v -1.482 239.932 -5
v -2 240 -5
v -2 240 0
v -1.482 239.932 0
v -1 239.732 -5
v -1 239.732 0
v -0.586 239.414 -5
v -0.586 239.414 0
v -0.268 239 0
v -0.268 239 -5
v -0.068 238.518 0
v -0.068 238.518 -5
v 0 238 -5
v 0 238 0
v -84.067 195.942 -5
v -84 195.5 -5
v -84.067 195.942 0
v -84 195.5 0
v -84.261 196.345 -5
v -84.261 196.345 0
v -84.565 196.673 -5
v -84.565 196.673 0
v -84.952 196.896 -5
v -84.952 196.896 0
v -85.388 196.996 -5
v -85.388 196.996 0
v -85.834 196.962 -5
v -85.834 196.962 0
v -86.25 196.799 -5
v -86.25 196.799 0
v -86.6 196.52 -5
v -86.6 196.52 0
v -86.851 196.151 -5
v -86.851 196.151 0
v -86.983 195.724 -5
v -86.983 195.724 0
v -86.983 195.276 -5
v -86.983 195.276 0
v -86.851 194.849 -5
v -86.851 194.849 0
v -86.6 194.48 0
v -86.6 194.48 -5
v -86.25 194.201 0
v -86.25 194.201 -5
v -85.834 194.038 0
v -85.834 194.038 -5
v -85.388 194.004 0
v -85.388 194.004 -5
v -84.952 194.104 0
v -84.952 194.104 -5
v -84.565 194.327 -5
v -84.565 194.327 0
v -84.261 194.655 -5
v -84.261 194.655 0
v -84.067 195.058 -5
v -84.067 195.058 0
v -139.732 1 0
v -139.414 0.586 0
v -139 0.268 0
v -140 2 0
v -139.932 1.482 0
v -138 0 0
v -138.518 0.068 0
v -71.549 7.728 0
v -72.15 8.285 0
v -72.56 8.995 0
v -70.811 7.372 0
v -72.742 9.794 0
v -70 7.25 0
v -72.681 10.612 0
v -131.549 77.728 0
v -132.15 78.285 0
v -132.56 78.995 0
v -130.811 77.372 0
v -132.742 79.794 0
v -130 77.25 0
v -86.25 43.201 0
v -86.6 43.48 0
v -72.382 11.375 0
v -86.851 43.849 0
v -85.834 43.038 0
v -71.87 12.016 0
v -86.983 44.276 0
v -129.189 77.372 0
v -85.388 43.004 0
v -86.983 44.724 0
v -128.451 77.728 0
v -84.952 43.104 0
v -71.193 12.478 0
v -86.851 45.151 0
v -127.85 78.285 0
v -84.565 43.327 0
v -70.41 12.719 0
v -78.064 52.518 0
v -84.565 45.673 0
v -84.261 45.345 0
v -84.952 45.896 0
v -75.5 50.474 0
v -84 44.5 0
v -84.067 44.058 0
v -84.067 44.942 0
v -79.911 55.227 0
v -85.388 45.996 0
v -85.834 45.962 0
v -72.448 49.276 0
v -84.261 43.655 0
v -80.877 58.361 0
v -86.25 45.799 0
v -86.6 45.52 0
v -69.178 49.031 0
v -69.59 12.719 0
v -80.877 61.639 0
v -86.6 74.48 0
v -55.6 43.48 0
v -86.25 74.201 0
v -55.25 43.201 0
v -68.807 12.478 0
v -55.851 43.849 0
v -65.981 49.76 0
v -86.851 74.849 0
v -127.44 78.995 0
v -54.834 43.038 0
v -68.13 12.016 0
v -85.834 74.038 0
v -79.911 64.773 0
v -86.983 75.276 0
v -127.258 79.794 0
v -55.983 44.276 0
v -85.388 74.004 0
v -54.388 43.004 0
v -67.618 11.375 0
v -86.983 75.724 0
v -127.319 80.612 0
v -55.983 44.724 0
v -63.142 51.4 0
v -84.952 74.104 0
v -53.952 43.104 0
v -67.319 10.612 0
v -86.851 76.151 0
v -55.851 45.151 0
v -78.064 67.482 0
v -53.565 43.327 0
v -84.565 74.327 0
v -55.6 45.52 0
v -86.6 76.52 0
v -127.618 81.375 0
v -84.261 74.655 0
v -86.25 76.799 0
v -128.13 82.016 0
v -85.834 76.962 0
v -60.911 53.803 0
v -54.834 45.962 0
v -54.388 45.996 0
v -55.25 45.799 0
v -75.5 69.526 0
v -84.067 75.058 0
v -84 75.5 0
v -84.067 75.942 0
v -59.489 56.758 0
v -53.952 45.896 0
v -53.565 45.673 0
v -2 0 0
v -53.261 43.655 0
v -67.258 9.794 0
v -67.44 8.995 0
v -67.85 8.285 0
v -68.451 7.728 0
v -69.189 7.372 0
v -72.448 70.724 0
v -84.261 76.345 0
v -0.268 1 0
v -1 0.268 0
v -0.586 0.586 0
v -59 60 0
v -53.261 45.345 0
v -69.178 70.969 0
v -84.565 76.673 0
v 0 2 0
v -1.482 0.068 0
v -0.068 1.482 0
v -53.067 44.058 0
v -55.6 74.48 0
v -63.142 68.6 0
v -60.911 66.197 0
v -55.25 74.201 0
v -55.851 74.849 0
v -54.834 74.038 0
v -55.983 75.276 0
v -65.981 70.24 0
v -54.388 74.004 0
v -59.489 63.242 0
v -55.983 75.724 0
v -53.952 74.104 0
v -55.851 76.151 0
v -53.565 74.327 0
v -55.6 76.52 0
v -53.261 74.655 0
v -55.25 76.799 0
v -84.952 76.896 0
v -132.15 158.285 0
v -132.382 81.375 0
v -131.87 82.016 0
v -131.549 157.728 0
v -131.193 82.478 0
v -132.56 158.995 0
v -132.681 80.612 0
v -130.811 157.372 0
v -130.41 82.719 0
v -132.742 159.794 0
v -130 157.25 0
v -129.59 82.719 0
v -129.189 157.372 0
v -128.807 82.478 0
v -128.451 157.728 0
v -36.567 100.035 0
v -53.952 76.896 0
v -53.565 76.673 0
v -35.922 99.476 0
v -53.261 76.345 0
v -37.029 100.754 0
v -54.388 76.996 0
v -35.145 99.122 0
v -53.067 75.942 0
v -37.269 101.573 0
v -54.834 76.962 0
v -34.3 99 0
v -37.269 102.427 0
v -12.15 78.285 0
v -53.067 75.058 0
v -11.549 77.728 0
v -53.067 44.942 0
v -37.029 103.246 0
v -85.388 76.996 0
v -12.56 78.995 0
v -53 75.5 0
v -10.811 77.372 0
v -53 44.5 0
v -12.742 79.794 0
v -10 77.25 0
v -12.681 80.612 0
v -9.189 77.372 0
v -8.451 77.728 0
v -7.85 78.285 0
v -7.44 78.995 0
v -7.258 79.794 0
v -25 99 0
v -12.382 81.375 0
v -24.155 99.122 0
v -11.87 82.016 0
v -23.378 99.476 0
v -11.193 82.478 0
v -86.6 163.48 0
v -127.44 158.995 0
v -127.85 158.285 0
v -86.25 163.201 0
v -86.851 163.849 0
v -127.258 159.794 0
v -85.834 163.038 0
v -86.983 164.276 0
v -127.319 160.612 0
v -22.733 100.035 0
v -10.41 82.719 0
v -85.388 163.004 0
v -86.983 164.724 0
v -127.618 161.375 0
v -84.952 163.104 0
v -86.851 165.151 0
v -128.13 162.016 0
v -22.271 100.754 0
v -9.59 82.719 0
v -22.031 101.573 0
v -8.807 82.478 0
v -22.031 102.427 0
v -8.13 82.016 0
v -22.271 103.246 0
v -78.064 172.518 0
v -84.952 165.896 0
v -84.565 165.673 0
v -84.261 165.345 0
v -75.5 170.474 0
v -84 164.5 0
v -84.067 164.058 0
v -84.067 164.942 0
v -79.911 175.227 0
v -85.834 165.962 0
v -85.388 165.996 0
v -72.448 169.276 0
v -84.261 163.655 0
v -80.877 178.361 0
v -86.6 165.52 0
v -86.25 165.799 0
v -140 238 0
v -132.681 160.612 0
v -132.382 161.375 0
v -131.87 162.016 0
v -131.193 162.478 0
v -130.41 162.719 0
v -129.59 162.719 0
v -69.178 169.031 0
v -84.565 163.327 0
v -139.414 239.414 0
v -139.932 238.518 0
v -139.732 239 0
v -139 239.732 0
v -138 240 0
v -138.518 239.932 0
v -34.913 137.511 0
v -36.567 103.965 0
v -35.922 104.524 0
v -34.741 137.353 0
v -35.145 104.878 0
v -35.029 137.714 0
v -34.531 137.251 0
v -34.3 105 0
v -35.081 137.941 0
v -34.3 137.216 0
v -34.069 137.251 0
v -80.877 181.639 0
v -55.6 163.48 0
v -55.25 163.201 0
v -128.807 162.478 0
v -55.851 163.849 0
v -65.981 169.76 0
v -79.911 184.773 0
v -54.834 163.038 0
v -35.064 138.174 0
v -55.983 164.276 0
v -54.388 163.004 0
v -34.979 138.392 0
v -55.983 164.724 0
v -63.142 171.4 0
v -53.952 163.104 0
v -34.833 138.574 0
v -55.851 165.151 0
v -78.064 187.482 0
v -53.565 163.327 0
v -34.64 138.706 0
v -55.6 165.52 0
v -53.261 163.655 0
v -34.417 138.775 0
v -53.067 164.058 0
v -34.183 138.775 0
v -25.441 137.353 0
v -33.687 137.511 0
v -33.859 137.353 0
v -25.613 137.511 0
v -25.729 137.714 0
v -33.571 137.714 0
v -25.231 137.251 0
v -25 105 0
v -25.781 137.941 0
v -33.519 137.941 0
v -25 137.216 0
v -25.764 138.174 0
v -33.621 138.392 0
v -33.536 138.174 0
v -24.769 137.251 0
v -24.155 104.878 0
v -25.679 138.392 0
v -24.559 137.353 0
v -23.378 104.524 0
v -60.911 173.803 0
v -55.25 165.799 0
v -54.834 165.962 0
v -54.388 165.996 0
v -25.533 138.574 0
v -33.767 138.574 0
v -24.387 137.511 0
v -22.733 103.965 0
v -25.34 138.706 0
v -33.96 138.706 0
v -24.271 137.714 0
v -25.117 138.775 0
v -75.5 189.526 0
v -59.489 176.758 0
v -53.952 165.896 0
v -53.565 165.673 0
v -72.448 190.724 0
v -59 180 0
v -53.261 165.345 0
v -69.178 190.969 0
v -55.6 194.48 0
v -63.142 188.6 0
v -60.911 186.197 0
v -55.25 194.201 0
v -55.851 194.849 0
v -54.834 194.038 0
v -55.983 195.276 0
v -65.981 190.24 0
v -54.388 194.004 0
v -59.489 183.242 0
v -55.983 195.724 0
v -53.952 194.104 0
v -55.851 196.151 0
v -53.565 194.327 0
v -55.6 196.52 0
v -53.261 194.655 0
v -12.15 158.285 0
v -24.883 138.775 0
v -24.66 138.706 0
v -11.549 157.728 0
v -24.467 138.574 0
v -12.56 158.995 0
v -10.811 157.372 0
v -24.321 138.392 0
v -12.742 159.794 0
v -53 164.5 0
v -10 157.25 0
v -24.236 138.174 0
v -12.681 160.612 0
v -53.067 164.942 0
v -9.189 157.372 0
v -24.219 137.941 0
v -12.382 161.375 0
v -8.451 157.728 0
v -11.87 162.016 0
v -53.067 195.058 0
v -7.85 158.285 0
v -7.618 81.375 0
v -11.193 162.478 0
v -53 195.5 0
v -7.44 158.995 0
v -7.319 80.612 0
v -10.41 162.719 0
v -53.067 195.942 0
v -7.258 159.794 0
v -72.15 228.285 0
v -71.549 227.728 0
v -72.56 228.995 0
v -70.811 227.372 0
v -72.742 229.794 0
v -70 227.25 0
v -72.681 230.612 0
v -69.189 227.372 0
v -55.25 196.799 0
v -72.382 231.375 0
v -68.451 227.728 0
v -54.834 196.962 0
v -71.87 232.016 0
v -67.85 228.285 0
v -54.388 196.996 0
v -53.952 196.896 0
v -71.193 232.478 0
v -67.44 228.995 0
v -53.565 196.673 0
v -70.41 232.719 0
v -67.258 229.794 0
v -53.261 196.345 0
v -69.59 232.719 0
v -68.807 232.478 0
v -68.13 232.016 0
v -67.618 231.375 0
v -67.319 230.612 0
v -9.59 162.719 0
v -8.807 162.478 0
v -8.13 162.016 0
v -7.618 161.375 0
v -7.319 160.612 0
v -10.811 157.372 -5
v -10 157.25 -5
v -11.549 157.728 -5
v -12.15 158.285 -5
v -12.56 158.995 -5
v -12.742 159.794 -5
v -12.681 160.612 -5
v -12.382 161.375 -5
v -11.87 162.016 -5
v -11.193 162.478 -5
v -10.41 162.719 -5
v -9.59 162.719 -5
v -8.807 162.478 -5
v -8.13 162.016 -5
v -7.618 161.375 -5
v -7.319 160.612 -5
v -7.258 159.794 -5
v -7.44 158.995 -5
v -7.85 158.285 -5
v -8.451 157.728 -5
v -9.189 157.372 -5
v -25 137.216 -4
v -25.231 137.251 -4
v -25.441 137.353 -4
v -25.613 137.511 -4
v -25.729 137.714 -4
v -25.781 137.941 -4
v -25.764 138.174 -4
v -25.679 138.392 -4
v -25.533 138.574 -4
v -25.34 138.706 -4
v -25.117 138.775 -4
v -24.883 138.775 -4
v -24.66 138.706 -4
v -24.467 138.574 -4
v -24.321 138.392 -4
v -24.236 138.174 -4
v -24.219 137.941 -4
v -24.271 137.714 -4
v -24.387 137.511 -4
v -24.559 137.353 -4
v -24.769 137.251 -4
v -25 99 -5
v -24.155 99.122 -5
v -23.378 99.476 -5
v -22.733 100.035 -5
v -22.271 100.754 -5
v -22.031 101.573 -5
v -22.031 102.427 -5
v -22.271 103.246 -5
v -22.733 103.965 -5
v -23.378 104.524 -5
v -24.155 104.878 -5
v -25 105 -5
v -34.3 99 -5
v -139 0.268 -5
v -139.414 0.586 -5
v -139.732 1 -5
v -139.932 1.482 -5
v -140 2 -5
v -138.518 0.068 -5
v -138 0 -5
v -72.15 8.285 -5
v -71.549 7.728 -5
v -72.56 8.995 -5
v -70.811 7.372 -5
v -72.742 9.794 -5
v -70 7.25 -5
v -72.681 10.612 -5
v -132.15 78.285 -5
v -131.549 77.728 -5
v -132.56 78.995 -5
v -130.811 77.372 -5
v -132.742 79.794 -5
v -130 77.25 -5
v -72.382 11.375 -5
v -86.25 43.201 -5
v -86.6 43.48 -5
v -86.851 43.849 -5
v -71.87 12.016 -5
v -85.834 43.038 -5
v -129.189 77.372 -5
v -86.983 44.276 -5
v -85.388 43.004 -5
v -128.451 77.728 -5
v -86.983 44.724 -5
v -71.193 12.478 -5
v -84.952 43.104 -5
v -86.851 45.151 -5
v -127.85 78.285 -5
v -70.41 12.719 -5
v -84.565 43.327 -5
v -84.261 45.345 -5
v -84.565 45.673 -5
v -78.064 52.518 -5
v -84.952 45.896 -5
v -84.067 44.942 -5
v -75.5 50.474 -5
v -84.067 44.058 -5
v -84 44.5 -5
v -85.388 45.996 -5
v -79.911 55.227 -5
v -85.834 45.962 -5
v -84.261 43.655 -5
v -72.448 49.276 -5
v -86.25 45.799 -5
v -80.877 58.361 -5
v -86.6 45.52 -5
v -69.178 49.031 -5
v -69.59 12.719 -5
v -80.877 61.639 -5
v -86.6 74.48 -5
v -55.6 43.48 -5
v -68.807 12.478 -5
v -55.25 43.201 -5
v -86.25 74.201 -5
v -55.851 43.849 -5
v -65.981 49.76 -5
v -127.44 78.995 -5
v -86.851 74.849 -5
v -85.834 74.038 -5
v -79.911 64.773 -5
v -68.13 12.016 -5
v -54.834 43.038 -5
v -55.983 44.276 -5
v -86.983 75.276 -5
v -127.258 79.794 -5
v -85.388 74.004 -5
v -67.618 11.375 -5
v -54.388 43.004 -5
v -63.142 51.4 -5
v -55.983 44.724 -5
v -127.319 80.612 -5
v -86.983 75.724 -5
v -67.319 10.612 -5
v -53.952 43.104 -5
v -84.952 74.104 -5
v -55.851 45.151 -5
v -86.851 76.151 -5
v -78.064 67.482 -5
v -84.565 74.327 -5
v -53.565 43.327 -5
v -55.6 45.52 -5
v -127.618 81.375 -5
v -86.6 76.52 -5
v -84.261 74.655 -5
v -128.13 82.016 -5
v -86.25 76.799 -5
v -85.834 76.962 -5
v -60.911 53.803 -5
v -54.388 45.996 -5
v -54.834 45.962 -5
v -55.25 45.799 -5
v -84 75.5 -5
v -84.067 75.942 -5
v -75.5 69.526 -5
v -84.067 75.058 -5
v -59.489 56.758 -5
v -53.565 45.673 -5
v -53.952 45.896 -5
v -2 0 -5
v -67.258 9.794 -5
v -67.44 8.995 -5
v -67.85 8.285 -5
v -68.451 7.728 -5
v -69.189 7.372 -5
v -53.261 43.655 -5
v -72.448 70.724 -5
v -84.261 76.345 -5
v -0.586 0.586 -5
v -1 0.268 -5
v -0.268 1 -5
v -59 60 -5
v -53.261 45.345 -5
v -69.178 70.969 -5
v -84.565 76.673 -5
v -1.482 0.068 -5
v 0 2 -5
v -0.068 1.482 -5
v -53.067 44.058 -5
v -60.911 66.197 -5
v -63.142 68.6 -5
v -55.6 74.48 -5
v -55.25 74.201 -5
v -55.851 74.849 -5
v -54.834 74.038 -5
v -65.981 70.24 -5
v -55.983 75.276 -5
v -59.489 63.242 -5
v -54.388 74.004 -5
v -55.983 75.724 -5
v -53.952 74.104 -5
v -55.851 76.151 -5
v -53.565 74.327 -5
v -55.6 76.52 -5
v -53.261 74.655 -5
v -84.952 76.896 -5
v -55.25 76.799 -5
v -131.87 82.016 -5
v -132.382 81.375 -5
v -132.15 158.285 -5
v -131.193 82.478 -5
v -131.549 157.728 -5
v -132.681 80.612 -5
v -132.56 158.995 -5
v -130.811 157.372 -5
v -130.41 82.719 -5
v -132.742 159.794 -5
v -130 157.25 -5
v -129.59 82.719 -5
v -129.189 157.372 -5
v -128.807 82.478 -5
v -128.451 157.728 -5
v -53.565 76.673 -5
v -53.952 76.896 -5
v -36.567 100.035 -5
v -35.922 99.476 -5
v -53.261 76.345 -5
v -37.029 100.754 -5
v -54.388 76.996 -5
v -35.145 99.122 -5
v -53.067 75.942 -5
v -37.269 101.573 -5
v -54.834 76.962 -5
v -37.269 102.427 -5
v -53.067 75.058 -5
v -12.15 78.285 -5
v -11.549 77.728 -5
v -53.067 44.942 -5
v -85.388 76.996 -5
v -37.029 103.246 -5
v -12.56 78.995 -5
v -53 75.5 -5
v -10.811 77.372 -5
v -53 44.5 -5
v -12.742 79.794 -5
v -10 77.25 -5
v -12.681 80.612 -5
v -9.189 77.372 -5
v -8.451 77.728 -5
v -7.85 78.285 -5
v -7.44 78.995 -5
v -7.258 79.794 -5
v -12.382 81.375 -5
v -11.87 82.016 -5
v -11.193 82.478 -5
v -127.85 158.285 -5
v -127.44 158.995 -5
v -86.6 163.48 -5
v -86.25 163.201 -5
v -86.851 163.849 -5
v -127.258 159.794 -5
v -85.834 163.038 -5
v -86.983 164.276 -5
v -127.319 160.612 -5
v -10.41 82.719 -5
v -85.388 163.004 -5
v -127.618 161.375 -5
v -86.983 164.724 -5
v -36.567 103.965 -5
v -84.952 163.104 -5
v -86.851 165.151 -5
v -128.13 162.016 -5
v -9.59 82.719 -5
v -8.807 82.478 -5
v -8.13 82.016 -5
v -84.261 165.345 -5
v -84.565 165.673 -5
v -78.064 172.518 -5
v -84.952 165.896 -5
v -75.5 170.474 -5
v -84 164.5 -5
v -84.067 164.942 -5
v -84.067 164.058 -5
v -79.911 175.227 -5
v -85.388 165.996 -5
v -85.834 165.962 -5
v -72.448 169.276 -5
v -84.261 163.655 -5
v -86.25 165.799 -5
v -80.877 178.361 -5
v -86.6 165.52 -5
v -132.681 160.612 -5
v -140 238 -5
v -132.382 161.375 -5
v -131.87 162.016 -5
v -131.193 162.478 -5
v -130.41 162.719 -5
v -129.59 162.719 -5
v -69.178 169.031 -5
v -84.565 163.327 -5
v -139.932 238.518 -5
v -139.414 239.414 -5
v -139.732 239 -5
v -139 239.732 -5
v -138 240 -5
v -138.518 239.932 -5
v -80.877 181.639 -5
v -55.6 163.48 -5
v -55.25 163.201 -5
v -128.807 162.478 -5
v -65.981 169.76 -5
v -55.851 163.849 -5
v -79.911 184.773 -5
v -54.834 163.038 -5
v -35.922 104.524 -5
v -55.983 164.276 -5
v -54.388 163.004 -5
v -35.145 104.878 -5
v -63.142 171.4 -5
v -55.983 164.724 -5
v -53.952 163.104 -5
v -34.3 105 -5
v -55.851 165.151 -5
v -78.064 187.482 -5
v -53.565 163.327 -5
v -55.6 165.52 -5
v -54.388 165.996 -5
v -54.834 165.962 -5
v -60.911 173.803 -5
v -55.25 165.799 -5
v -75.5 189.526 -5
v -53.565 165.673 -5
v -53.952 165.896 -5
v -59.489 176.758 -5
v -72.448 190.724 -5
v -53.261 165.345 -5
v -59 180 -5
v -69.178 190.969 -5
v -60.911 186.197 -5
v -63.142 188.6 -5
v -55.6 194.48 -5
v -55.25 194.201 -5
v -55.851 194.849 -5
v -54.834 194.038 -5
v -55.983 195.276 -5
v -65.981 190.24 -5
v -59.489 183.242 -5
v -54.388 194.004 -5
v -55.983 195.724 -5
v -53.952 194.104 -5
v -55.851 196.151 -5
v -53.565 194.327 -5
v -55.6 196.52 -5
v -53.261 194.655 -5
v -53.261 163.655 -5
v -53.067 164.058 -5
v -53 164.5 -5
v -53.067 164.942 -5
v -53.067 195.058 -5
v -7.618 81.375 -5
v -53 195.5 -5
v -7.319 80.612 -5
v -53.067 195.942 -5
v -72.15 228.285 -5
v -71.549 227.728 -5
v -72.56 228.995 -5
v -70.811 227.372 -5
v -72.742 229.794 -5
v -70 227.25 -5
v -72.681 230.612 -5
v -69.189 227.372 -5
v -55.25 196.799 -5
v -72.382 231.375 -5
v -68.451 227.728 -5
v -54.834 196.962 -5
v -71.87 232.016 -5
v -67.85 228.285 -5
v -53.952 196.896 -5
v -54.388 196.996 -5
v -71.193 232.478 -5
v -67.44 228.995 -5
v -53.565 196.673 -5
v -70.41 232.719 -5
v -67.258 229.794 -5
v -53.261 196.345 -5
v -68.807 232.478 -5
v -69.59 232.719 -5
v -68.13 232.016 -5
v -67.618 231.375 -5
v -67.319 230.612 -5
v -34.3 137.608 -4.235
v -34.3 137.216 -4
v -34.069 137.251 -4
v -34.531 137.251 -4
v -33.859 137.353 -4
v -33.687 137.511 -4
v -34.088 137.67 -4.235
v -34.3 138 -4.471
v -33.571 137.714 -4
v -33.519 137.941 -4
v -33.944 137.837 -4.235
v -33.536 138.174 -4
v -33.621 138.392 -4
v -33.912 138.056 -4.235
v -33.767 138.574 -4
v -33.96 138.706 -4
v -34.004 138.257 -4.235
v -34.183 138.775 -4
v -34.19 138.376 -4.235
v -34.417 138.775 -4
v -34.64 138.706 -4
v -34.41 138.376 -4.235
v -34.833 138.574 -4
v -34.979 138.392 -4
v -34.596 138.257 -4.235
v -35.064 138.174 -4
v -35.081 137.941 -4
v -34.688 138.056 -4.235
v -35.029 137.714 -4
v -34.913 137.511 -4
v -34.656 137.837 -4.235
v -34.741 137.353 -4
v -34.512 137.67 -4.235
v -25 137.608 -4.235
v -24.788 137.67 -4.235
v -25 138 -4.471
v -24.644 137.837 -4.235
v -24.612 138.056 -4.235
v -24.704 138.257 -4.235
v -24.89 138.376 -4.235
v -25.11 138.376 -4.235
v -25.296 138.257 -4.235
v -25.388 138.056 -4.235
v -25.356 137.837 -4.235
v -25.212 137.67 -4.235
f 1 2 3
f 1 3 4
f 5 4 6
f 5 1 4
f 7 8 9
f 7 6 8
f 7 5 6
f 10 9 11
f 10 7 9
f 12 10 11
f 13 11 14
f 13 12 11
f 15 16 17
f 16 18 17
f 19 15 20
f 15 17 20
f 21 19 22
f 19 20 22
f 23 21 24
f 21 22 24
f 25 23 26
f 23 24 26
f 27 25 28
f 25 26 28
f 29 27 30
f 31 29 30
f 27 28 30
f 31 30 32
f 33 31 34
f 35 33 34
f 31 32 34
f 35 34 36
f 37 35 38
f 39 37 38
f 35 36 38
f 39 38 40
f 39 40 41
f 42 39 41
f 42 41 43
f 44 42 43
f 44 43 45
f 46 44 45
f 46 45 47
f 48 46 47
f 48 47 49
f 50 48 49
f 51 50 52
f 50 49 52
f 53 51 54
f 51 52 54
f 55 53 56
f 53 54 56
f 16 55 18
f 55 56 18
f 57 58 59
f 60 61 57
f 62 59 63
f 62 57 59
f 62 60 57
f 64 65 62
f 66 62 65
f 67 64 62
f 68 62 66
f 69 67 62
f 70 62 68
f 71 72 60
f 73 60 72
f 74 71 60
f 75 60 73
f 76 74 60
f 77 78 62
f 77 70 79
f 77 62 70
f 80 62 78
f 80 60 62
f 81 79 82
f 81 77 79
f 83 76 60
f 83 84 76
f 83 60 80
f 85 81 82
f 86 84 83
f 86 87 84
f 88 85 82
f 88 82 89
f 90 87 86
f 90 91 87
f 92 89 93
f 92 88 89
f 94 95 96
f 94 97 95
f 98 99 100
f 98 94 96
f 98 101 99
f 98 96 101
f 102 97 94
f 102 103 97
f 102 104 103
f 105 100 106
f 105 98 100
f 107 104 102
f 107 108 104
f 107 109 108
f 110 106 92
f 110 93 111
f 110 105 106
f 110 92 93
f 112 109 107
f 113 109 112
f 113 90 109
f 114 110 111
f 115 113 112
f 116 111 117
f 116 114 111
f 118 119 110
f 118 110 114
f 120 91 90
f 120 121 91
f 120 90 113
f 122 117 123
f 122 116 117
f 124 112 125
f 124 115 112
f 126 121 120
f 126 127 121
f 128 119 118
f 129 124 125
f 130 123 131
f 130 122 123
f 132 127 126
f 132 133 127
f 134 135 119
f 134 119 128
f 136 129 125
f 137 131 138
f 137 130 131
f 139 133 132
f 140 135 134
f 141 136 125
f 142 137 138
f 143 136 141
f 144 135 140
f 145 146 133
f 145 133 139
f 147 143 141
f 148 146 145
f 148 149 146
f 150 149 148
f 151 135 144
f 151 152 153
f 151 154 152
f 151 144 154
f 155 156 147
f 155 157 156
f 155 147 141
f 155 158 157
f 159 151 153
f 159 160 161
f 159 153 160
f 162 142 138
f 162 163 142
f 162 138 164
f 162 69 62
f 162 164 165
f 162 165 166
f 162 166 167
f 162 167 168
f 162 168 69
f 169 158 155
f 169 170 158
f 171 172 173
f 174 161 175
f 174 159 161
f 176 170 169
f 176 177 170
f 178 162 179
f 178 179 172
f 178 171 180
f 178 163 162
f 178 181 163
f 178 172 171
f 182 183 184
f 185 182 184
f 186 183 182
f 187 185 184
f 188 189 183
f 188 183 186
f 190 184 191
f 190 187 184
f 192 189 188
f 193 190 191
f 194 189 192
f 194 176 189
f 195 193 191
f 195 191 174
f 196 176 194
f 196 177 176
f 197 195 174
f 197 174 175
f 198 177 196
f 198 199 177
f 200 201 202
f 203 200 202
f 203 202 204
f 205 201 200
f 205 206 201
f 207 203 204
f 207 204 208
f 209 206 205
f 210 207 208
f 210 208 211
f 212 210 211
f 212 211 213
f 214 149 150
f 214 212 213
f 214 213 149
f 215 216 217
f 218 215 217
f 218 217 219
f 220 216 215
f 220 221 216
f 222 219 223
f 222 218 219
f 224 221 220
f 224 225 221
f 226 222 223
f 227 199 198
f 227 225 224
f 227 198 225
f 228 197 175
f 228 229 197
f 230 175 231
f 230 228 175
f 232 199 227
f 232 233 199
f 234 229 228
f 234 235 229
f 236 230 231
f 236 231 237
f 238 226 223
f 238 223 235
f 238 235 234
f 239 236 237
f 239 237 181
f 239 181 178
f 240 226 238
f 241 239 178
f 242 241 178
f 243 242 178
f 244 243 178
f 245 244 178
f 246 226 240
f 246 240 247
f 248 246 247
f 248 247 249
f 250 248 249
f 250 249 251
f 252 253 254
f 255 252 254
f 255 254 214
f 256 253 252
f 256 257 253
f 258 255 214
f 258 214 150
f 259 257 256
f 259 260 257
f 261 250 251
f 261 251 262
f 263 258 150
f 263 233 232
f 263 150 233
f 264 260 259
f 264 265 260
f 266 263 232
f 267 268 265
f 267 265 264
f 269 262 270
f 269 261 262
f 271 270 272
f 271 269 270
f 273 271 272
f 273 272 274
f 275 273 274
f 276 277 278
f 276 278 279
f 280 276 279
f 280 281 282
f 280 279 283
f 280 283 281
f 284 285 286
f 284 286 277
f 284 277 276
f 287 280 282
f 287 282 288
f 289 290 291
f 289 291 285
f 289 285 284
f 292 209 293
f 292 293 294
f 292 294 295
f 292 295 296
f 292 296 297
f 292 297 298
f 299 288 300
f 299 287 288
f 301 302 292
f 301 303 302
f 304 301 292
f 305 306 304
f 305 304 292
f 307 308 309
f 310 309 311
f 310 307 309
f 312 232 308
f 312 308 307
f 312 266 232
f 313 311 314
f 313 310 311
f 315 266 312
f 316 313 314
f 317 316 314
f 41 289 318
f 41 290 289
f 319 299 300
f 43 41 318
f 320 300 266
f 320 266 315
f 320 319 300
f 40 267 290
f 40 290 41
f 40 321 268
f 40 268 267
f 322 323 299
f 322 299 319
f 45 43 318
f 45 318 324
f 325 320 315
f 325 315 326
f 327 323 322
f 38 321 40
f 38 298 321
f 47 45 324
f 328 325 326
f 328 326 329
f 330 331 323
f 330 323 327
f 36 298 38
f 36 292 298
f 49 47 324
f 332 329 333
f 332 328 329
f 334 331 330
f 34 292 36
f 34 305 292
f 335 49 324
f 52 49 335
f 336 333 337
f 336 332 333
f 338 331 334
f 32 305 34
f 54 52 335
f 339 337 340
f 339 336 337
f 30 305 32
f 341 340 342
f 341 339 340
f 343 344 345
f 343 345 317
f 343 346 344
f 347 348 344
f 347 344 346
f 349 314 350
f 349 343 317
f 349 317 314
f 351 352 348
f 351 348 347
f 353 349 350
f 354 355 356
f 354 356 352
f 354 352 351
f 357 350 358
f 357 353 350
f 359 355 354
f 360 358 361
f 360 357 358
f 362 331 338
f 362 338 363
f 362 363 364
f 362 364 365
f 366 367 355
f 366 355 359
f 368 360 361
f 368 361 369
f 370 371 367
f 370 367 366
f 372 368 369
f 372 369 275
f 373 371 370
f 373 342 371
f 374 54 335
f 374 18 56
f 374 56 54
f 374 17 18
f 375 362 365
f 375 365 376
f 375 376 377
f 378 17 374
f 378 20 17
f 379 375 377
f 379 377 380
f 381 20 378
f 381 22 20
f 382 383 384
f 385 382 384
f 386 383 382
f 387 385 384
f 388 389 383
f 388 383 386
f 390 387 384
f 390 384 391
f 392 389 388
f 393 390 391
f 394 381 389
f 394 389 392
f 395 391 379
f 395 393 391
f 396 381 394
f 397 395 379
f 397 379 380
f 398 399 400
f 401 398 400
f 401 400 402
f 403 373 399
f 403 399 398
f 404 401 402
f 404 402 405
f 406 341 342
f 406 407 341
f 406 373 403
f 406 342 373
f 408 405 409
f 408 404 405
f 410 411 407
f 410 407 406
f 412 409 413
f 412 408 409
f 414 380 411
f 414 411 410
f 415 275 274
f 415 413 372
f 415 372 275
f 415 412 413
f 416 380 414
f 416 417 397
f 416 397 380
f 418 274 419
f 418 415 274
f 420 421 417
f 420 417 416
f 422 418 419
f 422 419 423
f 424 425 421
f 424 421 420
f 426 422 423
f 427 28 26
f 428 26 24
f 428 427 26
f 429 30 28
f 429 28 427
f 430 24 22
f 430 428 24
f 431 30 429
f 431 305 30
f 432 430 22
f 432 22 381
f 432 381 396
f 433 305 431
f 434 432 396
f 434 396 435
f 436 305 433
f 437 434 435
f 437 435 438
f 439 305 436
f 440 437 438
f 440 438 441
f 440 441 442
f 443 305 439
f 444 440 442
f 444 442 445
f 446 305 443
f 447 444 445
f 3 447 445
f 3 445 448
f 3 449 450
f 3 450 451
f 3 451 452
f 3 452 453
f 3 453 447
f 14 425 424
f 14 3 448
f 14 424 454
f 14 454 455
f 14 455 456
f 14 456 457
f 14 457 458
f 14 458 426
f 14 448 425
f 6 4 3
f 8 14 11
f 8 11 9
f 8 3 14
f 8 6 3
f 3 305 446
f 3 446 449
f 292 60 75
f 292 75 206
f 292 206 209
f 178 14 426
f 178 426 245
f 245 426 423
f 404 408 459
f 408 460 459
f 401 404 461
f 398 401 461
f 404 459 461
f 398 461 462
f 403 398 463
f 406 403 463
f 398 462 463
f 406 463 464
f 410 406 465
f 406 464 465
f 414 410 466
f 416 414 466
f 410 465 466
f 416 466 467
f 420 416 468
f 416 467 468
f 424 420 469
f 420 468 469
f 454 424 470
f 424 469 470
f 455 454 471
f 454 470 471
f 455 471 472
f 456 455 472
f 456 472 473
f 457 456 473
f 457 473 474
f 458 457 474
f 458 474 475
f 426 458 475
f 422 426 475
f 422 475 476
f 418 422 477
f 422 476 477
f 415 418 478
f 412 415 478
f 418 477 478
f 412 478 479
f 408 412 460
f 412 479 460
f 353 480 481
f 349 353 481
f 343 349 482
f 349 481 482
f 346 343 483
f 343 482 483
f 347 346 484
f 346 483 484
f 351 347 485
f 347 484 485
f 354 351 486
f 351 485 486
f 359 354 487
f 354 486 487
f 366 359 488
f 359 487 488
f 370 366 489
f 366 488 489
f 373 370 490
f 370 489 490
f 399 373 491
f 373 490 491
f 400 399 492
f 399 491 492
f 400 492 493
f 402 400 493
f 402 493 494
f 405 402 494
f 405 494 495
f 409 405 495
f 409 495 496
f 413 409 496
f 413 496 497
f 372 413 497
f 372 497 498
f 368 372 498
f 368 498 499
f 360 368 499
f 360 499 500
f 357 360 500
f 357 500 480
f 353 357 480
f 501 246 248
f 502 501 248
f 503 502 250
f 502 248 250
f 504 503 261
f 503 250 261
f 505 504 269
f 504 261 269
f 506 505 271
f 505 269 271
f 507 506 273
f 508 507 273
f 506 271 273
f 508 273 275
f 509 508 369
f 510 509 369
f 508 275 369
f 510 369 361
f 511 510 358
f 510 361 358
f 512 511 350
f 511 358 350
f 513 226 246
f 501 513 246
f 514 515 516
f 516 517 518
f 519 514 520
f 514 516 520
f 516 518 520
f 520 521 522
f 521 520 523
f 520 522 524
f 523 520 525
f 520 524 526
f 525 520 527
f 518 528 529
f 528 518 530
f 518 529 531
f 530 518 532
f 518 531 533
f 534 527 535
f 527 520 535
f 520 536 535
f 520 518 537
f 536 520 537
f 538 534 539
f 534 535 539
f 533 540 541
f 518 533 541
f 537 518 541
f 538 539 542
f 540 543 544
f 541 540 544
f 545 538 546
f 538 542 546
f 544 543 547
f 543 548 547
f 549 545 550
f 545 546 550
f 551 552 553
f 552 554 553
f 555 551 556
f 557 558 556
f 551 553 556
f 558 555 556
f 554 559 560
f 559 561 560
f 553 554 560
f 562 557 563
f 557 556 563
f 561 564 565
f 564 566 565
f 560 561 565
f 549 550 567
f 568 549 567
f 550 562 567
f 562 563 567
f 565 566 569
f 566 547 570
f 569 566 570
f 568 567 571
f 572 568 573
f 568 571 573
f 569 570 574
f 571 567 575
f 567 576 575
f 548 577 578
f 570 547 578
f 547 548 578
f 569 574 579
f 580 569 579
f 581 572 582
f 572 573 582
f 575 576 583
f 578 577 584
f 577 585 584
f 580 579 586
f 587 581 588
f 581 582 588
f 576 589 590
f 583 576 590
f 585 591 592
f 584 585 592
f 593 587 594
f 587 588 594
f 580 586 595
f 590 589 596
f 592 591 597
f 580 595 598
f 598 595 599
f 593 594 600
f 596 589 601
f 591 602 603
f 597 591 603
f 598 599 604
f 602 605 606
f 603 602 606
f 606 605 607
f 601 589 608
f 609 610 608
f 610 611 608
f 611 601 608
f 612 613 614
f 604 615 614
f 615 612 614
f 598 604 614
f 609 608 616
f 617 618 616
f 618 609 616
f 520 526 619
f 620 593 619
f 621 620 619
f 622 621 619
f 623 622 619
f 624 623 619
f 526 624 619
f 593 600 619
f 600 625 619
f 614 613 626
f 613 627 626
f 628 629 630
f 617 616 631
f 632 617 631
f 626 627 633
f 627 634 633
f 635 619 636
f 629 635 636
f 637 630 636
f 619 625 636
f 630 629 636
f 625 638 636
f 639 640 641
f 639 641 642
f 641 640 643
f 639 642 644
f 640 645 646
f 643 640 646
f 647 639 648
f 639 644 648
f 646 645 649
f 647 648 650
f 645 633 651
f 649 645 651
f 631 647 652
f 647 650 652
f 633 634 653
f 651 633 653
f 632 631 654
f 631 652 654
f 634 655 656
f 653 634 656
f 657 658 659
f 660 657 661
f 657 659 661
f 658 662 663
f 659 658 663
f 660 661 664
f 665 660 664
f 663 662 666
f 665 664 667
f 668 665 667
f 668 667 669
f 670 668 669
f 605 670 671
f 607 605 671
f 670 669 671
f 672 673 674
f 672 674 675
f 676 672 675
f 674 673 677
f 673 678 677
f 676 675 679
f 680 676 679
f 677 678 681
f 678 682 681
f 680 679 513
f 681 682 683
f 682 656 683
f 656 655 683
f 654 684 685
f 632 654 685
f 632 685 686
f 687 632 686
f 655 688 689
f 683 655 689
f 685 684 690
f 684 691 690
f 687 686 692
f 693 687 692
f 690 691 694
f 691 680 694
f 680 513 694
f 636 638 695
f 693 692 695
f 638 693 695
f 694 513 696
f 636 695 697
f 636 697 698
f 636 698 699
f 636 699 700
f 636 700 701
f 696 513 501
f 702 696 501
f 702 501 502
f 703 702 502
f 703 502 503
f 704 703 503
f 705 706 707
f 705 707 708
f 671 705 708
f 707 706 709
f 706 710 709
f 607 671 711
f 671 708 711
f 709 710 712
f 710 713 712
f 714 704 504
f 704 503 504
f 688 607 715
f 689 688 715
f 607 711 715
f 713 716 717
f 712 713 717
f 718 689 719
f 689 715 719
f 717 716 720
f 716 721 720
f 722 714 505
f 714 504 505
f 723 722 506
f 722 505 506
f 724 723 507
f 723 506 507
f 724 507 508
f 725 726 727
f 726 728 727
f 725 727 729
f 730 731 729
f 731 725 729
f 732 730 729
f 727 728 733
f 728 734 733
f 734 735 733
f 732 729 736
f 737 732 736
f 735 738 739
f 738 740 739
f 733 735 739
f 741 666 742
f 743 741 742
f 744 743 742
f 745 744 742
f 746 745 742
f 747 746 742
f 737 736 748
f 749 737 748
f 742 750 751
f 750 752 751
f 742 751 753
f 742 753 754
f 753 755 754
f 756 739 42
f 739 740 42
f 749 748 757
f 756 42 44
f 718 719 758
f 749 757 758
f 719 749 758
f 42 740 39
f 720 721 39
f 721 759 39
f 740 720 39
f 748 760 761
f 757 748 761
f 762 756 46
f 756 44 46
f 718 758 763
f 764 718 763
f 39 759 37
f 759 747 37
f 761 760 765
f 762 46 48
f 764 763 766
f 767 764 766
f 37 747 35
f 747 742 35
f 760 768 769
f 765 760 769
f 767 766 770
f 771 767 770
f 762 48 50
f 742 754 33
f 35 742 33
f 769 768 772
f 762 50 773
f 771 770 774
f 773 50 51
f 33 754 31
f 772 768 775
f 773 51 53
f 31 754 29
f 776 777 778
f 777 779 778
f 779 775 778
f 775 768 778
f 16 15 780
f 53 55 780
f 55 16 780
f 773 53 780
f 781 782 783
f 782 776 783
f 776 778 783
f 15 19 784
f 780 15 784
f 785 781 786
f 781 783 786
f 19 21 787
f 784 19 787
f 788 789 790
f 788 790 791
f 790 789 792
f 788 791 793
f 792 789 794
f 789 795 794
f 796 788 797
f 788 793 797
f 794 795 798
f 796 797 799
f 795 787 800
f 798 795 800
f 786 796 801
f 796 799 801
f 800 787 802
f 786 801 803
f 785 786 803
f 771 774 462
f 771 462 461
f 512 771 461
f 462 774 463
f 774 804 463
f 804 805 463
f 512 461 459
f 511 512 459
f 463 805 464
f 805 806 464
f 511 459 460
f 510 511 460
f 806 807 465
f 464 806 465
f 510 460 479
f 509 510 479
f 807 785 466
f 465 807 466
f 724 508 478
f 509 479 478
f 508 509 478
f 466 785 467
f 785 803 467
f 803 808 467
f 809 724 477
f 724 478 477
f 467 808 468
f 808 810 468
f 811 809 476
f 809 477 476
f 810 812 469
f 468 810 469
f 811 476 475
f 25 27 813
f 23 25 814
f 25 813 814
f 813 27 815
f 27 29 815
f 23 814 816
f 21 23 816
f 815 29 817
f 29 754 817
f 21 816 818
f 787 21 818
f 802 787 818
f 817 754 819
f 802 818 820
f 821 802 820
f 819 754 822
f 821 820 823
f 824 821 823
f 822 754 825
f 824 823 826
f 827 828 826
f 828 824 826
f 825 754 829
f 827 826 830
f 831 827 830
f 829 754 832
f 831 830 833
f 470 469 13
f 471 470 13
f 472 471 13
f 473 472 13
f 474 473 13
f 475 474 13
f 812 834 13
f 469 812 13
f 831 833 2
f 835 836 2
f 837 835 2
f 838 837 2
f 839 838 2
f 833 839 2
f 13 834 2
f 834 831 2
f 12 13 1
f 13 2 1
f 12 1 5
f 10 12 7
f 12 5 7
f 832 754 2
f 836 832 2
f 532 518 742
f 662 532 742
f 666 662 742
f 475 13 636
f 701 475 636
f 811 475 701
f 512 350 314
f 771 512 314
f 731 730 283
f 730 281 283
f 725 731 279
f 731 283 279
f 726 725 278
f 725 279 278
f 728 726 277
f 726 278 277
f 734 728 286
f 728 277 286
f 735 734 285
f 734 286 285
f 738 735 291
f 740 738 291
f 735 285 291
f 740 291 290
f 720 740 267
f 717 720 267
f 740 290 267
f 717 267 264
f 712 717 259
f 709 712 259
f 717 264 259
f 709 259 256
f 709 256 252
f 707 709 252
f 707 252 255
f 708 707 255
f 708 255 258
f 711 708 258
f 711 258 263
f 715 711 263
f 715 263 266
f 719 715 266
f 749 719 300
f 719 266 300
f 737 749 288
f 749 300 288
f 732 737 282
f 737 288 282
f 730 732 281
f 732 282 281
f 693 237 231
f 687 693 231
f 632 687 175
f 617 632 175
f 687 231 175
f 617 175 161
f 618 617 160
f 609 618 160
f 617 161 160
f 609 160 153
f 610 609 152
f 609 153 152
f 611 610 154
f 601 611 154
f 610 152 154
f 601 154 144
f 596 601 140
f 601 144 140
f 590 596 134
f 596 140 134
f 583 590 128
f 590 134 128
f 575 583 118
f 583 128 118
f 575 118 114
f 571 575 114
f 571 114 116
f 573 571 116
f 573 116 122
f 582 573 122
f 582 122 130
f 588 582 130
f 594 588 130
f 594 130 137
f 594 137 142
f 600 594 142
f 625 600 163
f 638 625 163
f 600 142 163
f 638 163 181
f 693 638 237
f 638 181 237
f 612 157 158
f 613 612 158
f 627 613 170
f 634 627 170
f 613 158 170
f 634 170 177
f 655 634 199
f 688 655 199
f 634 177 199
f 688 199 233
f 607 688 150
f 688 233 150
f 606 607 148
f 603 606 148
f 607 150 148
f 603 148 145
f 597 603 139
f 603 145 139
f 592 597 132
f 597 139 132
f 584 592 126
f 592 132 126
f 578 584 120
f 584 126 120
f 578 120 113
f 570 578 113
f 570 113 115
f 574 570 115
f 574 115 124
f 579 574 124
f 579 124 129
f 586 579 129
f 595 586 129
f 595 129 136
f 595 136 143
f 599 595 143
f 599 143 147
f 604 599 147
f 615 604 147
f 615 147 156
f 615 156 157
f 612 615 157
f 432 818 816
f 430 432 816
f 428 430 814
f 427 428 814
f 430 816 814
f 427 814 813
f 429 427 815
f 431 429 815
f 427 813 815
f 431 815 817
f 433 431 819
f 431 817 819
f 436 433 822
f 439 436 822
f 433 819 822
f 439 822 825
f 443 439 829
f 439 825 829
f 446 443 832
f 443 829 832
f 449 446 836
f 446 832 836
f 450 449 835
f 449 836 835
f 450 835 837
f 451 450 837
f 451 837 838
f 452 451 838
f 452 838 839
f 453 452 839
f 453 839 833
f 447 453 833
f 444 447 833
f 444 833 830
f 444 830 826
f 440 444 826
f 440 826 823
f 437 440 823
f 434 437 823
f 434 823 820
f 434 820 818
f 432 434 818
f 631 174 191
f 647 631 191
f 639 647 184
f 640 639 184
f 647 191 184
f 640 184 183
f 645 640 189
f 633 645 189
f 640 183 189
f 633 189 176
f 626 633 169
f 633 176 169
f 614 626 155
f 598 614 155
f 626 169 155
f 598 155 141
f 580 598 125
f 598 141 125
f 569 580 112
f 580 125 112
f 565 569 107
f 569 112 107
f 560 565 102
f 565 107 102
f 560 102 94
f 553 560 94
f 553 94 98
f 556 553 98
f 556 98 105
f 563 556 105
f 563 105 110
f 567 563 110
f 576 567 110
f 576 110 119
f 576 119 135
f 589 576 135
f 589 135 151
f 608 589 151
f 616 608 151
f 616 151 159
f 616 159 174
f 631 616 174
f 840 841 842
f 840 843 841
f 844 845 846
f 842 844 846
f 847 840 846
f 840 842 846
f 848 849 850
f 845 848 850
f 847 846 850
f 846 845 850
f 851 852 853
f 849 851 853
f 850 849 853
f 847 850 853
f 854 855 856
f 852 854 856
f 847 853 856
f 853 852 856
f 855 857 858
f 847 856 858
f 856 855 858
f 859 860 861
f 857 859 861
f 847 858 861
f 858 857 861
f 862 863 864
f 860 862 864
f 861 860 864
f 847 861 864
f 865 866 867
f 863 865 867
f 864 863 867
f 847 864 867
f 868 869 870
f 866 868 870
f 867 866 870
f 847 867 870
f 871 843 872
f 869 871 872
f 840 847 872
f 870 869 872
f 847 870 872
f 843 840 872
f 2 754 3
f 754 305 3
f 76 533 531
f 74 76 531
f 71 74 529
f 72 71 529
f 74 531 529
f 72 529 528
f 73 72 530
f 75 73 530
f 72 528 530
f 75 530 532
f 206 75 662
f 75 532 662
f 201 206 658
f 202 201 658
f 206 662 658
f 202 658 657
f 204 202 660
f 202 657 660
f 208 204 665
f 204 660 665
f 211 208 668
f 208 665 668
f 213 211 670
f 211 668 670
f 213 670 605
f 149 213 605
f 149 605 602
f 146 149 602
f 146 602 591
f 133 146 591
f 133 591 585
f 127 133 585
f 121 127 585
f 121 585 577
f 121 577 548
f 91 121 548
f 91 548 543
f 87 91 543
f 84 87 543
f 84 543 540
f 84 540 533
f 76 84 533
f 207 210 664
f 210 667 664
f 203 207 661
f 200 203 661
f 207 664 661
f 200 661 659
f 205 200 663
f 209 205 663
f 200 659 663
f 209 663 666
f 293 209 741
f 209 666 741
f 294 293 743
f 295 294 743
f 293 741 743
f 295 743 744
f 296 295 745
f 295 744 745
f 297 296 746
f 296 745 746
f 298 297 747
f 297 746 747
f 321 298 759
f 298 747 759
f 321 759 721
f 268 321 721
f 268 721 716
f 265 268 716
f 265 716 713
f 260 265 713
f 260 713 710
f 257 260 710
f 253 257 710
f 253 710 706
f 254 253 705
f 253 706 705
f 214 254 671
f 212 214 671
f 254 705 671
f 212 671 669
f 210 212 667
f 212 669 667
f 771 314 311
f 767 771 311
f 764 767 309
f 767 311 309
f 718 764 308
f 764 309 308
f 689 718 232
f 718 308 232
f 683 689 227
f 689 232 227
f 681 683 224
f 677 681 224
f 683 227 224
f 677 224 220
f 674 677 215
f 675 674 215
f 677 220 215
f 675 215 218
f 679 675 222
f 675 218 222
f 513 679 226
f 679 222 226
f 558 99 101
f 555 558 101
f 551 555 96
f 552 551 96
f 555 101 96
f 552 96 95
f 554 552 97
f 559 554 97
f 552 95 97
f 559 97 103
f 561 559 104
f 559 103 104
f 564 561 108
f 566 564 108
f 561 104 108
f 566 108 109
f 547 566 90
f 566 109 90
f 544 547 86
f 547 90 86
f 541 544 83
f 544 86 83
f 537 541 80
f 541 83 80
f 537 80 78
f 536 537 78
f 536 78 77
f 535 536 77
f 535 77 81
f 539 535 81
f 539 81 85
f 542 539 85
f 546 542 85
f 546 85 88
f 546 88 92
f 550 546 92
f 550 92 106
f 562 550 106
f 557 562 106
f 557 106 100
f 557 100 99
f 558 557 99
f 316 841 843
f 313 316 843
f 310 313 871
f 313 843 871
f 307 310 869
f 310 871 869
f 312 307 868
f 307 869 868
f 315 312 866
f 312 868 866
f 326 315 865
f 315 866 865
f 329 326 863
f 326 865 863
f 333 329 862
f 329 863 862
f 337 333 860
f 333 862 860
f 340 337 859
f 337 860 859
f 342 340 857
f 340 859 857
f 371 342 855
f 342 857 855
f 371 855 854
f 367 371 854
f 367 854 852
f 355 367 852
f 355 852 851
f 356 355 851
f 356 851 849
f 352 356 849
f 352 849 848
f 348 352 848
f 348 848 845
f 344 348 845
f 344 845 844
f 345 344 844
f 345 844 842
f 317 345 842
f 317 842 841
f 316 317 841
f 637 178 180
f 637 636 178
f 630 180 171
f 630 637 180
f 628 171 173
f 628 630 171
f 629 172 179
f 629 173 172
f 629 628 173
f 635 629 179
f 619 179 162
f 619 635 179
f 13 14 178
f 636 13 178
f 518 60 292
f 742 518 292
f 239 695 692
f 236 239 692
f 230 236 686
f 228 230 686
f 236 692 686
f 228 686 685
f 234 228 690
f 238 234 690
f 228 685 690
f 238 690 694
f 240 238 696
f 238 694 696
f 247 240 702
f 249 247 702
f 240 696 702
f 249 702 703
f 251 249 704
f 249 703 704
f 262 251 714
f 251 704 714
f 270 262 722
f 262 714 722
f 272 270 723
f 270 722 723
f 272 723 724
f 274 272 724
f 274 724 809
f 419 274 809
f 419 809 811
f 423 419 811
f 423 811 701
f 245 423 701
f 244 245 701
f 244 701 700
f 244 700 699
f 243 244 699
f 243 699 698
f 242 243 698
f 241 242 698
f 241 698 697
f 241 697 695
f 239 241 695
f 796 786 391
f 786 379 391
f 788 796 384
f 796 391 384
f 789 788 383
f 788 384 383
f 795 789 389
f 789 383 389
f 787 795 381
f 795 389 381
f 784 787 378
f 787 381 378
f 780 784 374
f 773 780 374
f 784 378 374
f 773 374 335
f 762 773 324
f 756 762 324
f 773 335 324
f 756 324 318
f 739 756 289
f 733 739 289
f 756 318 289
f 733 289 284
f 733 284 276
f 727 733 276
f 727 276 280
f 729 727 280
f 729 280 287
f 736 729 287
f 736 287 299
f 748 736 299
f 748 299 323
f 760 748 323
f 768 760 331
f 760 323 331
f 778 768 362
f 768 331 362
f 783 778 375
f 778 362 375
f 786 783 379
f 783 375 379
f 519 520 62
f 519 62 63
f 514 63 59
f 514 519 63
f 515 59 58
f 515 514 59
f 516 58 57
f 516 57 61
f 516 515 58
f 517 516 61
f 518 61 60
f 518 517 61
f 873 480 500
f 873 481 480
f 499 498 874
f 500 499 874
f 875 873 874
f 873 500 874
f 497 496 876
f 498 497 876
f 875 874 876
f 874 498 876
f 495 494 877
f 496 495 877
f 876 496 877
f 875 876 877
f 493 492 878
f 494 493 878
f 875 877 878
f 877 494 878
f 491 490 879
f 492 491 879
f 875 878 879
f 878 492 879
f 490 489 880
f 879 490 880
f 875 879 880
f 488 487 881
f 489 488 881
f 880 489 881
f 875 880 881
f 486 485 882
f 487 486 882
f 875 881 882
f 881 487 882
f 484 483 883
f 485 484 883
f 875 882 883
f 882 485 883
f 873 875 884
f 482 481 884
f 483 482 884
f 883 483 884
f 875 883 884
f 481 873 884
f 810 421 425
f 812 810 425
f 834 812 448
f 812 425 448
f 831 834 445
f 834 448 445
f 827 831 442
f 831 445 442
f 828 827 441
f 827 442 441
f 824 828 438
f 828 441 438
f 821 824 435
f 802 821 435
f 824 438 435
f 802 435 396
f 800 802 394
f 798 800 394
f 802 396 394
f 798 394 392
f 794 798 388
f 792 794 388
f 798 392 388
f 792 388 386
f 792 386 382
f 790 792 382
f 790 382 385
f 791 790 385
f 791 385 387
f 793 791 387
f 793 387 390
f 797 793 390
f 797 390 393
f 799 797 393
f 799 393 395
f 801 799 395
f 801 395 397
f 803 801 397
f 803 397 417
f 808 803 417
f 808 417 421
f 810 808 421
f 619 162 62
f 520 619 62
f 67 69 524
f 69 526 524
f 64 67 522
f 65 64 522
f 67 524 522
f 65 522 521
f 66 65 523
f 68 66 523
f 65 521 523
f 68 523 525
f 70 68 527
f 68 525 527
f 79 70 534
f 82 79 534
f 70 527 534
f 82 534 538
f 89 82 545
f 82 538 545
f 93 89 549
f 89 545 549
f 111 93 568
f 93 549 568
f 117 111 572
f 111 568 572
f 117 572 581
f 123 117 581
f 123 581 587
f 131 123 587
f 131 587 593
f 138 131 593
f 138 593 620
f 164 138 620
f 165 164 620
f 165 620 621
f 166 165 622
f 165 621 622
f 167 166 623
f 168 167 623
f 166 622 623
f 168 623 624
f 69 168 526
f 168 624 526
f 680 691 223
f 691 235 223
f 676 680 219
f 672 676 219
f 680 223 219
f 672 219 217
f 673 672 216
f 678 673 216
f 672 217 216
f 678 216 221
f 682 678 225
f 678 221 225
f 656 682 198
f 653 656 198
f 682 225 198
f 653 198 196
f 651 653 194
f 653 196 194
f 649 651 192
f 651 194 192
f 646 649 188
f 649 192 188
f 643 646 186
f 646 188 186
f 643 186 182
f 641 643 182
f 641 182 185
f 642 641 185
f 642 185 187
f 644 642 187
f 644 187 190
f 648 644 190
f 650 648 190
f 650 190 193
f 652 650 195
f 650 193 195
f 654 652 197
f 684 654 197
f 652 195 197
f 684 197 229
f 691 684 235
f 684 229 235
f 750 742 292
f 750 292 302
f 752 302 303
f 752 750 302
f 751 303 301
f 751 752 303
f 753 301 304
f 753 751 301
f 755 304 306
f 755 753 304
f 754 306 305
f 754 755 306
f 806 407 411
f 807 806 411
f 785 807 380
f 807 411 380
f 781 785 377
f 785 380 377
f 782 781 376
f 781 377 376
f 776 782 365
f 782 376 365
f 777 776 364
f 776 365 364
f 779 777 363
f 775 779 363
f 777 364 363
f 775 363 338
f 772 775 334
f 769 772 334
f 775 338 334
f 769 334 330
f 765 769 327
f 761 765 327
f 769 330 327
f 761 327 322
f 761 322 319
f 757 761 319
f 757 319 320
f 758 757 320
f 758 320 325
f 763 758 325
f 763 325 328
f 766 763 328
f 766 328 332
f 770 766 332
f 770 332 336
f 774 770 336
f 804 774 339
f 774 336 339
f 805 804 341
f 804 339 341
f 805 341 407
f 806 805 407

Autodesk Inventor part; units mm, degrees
ref_plane "YZ Plane" through (0, 0, 0) normal (1, 0, 0) x (0, 1, 0)
ref_plane "XZ Plane" through (0, 0, 0) normal (0, 1, 0) x (-1, 0, 0)
sketch "Skizze3" plane through (0, 0, 0) normal (0, 0, 1) x (1, 0, 0)
  line L0 (0, 0) -> (-140, 0)
  line L1 (-140, 0) -> (-140, 120)
  line L2 (-140, 240) -> (0, 240)
  line L3 (0, 240) -> (0, 0)
  line L4 (-34.5565, 44.5) -> (-109.2584, 44.5) construction
  line L5 (-42.5521, 75.5) -> (-110.6291, 75.5) construction
  line L6 (-85.5, 104.3529) -> (-85.5, 36.2759) construction
  line L7 (-54.5, 102.2969) -> (-54.5, 32.1639) construction
  line L8 (-70, -15.9958) -> (-70, 12.0858) construction
  circle A0 centre (-70, 60) radius 11
  circle A1 centre (-85.5, 75.5) radius 1.5
  circle A2 centre (-85.5, 44.5) radius 1.5
  circle A3 centre (-54.5, 44.5) radius 1.5
  circle A4 centre (-54.5, 75.5) radius 1.5
  line L9 (-140, 120) -> (0, 120) construction
  line L10 (-140, 120) -> (-140, 240)
  line L11 (-139.4457, 80) -> (19.1397, 80) construction
  line L12 (12.4919, 138) -> (-57.0145, 138) construction
  line L13 (-25, 139.378) -> (-25, 104.3529) construction
  line L14 (-34.3, 147.3505) -> (-34.3, 112.3254) construction
  line L15 (-25, 102) -> (-34.3, 102) construction
  line L16 (-25, 105) -> (-34.3, 105)
  line L17 (-34.3, 99) -> (-25, 99)
  arc A5 (-25, 99) -> (-25, 105) centre (-25, 102) ccw
  arc A6 (-34.3, 105) -> (-34.3, 99) centre (-34.3, 102) ccw
  line L18 (-6.3901, 160) -> (-134.3919, 160) construction
  point P0 (-70, 0)
  point P1 (-70, 10)
  point P2 (-130, 80)
  point P3 (-137.8382, 80)
  point P4 (-130, 160)
  point P5 (-10, 160)
  point P6 (-10, 80)
  point P7 (-70, 230)
  point P8 (-34.3, 138)
  point P9 (-25, 138)
  point P10 (-29.65, 102)
  dimension "d4" = 240
  dimension "d5" = 140
  dimension "d6" = 31
  dimension "d7" = 31
  dimension "d8" = 15.5
  dimension "d9" = 15.5
  dimension "d10" = 60
  dimension "d11" = 22
  dimension "d12" = 3
  dimension "d13" = 3
  dimension "d14" = 3
  dimension "d15" = 3
  dimension "d22" = 10
  dimension "d23" = 10
  dimension "d24" = 10
  dimension "d25" = 10
  dimension "d26" = 10
  dimension "d34" = 10
  dimension "d35" = 9.3
  dimension "d36" = 18
  dimension "d37" = 25
  dimension "d38" = 3
  dimension "d43" = 36
  dimension "d44" = 80
  dimension "d45" = 80
extrude "Extrusion3" add sketch "Skizze3" against normal blind 5 contours L0 L1 L10 L2 L3 | A0 | A1 | A2 | A3 | A4 | A5 L17 A6 L16
fillet "Rundung1" radius 2 4 edges at (0, 0, -2.5) (0, 240, -2.5) (-140, 240, -2.5) (-140, 0, -2.5)
ref_plane "Arbeitsebene1" through (-140, 120, 0) normal (0, 1, 0) x (1, 0, 0)
extrude "Extrusion4" cut sketch "Skizze3" against normal through all contours A0 | A1 | A2 | A3 | A4
mirror "Spiegeln1" about plane through (-140, 120, 0) normal (0, 1, 0) of "Extrusion4"
hole "Bohrung1" at (-70, 60, 0) at (-70, 10, 0) at (-130, 80, 0) at (-130, 160, 0) at (-10, 160, 0) at (-10, 80, 0) at (-70, 230, 0) direction (0, 0, -1) diameter 5.5 end through all
extrude "Extrusion5" cut sketch "Skizze3" against normal blind 10 contours A5 L17 A6 L16
hole "Bohrung2" at (-25, 138, 0) at (-34.3, 138, 0) direction (0, 0, -1) diameter 1.567 depth 4 tip angle 118 thread size "M2x0.4" class "6H" standard "ISO Metric profile"
equation "\"d8\" = 0.5 * d6"
equation "\"d9\" = d8"
equation "\"d23\" = d22"
equation "\"d24\" = d23"
equation "\"d25\" = d22"
equation "\"d26\" = d25"
equation "\"d36\" = 0.5 * d43"
properties part number "BT001_trajan20_21" material "Acryl"
